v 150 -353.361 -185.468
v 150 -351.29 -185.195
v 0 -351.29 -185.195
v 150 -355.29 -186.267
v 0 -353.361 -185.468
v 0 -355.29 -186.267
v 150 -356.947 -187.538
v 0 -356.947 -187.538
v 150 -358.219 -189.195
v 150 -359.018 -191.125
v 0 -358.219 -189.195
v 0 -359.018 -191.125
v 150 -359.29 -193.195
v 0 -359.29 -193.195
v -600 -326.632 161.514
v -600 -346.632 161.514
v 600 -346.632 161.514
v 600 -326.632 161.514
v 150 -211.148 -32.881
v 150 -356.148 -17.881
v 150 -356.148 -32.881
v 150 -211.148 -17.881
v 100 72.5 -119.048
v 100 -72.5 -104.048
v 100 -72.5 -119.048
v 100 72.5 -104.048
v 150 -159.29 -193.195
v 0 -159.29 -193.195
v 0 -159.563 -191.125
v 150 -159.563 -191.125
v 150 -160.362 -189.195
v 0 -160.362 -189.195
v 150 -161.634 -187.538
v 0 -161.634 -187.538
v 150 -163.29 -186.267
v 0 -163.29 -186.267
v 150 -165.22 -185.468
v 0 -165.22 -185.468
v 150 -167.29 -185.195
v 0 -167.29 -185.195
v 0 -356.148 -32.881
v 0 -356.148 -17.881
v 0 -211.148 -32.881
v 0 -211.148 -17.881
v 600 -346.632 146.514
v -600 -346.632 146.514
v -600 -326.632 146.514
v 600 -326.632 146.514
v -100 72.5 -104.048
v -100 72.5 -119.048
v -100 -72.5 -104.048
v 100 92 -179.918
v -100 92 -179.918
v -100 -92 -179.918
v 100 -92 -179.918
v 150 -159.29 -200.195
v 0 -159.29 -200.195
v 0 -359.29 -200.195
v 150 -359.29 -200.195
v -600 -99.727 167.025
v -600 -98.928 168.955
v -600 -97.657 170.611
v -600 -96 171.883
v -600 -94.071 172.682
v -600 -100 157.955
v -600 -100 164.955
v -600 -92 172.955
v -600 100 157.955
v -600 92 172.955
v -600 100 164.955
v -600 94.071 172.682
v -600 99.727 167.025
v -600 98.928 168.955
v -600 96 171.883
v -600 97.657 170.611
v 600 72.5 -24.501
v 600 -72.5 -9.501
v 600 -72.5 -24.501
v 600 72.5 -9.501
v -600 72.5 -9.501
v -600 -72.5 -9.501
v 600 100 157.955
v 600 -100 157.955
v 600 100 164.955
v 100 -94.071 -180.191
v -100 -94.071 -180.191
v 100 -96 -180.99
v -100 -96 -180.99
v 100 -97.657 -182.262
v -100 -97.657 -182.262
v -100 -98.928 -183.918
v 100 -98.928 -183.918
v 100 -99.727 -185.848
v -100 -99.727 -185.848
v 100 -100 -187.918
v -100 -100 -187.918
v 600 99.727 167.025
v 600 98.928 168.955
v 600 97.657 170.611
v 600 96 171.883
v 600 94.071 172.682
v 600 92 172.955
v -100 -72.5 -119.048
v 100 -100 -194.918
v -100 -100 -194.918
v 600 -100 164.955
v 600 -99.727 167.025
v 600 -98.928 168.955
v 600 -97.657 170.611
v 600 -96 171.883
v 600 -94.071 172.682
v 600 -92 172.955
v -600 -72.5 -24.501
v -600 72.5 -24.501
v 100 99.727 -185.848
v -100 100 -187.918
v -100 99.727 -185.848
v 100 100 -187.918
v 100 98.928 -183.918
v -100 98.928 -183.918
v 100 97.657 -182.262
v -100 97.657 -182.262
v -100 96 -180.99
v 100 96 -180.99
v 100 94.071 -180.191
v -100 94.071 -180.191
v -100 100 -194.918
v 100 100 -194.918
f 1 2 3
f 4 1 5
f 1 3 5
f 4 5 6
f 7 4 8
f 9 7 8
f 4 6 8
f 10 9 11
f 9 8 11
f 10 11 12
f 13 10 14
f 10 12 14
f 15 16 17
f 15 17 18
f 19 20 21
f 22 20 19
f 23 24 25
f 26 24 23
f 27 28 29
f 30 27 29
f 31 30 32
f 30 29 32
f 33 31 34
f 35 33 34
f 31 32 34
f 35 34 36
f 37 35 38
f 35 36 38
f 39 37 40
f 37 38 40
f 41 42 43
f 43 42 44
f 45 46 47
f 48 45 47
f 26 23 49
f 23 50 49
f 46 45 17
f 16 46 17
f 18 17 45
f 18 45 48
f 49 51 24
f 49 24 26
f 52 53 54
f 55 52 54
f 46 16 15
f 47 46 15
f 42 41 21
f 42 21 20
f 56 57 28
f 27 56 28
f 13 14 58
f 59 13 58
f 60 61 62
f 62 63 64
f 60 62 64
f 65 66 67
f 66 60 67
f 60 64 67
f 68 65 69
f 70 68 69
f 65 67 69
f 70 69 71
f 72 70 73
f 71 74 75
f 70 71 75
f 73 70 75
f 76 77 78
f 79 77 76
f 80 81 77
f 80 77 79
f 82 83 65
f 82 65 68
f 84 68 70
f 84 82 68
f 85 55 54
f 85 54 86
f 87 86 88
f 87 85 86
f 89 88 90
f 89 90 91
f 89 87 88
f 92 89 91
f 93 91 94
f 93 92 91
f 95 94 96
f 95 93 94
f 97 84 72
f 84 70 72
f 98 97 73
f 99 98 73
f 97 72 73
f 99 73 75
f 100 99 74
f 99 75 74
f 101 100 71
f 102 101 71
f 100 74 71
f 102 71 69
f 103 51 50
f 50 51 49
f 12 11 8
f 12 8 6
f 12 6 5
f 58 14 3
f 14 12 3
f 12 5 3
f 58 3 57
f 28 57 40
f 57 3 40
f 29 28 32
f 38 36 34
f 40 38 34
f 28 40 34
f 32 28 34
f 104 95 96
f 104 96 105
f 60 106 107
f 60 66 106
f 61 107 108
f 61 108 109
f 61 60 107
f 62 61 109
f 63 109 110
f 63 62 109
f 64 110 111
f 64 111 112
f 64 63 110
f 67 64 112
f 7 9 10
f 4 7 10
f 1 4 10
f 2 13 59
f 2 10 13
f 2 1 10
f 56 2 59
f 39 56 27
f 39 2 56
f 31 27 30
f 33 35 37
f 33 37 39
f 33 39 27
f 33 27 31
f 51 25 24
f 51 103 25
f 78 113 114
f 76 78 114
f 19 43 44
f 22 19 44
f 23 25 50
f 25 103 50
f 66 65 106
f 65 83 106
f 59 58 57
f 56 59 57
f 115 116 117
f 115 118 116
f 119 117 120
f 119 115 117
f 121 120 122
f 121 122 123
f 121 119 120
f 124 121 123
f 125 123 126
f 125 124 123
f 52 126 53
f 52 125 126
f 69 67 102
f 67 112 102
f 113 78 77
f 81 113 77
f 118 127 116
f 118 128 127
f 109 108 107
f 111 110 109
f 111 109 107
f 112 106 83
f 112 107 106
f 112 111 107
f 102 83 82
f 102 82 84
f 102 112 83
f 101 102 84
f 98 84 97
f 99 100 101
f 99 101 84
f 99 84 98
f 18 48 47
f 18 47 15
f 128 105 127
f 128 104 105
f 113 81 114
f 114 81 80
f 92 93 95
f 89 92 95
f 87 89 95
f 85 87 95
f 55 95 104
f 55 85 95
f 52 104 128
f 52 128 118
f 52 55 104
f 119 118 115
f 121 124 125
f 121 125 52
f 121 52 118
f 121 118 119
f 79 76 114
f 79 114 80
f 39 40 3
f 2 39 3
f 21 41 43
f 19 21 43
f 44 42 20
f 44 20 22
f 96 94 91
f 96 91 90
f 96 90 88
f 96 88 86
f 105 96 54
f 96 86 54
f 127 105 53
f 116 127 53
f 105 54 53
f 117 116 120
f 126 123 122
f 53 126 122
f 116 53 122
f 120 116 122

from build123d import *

# Parameters (mm, degrees)
F0_W      = 200
F0_H      = 15
F1_DEPTH  = 600
F2_R      = 8
F3_W      = 145
F3_H      = 15
F4_DEPTH  = 600
F5_W      = 145
F5_H      = 15
F6_DEPTH  = 100
F7_W      = 145
F7_H      = 15
F8_DEPTH  = 150
F9_W      = 20
F9_H      = 15
F10_DEPTH = 600


with BuildPart() as f1:
    # F0 (on Right) → F1 (new body, symmetric)
    with BuildSketch(Plane.YZ):
        with Locations((0, 165.454568)):
            Rectangle(F0_W, F0_H)
    extrude(amount=F1_DEPTH, both=True)

    # F2
    f2_edges = [f1.edges().sort_by_distance(p)[0] for p in [
        (0, -100, 172.954568),
        (0, 100, 172.954568),
    ]]
    fillet(f2_edges, radius=F2_R)


with BuildPart() as f4:
    # F3 (on Right) → F4 (new body, symmetric)
    with BuildSketch(Plane.YZ):
        with Locations((0, -17.001184)):
            Rectangle(F3_W, F3_H)
    extrude(amount=F4_DEPTH, both=True)


with BuildPart() as f6:
    # F5 (on Right) → F6 (new body, symmetric)
    with BuildSketch(Plane.YZ):
        with Locations((0, -111.548014)):
            Rectangle(F5_W, F5_H)
        with BuildLine():
            ThreePointArc((100, -187.918371), (97.656854, -182.261517), (92, -179.918371))
            Line((92, -179.918371), (-92, -179.918371))
            ThreePointArc((-92, -179.918371), (-97.656854, -182.261517), (-100, -187.918371))
            Line((-100, -187.918371), (-100, -194.918371))
            Line((-100, -194.918371), (100, -194.918371))
            Line((100, -194.918371), (100, -187.918371))
        make_face()
    extrude(amount=F6_DEPTH, both=True)


with BuildPart() as f8:
    # F7 (on Right) → F8 (new body)
    with BuildSketch(Plane.YZ):
        with Locations((-283.648392, -25.380761)):
            Rectangle(F7_W, F7_H)
        with BuildLine():
            Line((-359.290451, -193.195312), (-359.290451, -200.195312))
            Line((-359.290451, -200.195312), (-159.290451, -200.195312))
            Line((-159.290451, -200.195312), (-159.290451, -193.195312))
            ThreePointArc((-159.290451, -193.195312), (-161.633597, -187.538458), (-167.290451, -185.195312))
            Line((-167.290451, -185.195312), (-351.290451, -185.195312))
            ThreePointArc((-351.290451, -185.195312), (-356.947305, -187.538458), (-359.290451, -193.195312))
        make_face()
    extrude(amount=F8_DEPTH)


with BuildPart() as f10:
    # F9 (on Right) → F10 (new body, symmetric)
    with BuildSketch(Plane.YZ):
        with Locations((-336.631676, 154.013715)):
            Rectangle(F9_W, F9_H)
    extrude(amount=F10_DEPTH, both=True)


solid = Compound([f1.part, f4.part, f6.part, f8.part, f10.part])
